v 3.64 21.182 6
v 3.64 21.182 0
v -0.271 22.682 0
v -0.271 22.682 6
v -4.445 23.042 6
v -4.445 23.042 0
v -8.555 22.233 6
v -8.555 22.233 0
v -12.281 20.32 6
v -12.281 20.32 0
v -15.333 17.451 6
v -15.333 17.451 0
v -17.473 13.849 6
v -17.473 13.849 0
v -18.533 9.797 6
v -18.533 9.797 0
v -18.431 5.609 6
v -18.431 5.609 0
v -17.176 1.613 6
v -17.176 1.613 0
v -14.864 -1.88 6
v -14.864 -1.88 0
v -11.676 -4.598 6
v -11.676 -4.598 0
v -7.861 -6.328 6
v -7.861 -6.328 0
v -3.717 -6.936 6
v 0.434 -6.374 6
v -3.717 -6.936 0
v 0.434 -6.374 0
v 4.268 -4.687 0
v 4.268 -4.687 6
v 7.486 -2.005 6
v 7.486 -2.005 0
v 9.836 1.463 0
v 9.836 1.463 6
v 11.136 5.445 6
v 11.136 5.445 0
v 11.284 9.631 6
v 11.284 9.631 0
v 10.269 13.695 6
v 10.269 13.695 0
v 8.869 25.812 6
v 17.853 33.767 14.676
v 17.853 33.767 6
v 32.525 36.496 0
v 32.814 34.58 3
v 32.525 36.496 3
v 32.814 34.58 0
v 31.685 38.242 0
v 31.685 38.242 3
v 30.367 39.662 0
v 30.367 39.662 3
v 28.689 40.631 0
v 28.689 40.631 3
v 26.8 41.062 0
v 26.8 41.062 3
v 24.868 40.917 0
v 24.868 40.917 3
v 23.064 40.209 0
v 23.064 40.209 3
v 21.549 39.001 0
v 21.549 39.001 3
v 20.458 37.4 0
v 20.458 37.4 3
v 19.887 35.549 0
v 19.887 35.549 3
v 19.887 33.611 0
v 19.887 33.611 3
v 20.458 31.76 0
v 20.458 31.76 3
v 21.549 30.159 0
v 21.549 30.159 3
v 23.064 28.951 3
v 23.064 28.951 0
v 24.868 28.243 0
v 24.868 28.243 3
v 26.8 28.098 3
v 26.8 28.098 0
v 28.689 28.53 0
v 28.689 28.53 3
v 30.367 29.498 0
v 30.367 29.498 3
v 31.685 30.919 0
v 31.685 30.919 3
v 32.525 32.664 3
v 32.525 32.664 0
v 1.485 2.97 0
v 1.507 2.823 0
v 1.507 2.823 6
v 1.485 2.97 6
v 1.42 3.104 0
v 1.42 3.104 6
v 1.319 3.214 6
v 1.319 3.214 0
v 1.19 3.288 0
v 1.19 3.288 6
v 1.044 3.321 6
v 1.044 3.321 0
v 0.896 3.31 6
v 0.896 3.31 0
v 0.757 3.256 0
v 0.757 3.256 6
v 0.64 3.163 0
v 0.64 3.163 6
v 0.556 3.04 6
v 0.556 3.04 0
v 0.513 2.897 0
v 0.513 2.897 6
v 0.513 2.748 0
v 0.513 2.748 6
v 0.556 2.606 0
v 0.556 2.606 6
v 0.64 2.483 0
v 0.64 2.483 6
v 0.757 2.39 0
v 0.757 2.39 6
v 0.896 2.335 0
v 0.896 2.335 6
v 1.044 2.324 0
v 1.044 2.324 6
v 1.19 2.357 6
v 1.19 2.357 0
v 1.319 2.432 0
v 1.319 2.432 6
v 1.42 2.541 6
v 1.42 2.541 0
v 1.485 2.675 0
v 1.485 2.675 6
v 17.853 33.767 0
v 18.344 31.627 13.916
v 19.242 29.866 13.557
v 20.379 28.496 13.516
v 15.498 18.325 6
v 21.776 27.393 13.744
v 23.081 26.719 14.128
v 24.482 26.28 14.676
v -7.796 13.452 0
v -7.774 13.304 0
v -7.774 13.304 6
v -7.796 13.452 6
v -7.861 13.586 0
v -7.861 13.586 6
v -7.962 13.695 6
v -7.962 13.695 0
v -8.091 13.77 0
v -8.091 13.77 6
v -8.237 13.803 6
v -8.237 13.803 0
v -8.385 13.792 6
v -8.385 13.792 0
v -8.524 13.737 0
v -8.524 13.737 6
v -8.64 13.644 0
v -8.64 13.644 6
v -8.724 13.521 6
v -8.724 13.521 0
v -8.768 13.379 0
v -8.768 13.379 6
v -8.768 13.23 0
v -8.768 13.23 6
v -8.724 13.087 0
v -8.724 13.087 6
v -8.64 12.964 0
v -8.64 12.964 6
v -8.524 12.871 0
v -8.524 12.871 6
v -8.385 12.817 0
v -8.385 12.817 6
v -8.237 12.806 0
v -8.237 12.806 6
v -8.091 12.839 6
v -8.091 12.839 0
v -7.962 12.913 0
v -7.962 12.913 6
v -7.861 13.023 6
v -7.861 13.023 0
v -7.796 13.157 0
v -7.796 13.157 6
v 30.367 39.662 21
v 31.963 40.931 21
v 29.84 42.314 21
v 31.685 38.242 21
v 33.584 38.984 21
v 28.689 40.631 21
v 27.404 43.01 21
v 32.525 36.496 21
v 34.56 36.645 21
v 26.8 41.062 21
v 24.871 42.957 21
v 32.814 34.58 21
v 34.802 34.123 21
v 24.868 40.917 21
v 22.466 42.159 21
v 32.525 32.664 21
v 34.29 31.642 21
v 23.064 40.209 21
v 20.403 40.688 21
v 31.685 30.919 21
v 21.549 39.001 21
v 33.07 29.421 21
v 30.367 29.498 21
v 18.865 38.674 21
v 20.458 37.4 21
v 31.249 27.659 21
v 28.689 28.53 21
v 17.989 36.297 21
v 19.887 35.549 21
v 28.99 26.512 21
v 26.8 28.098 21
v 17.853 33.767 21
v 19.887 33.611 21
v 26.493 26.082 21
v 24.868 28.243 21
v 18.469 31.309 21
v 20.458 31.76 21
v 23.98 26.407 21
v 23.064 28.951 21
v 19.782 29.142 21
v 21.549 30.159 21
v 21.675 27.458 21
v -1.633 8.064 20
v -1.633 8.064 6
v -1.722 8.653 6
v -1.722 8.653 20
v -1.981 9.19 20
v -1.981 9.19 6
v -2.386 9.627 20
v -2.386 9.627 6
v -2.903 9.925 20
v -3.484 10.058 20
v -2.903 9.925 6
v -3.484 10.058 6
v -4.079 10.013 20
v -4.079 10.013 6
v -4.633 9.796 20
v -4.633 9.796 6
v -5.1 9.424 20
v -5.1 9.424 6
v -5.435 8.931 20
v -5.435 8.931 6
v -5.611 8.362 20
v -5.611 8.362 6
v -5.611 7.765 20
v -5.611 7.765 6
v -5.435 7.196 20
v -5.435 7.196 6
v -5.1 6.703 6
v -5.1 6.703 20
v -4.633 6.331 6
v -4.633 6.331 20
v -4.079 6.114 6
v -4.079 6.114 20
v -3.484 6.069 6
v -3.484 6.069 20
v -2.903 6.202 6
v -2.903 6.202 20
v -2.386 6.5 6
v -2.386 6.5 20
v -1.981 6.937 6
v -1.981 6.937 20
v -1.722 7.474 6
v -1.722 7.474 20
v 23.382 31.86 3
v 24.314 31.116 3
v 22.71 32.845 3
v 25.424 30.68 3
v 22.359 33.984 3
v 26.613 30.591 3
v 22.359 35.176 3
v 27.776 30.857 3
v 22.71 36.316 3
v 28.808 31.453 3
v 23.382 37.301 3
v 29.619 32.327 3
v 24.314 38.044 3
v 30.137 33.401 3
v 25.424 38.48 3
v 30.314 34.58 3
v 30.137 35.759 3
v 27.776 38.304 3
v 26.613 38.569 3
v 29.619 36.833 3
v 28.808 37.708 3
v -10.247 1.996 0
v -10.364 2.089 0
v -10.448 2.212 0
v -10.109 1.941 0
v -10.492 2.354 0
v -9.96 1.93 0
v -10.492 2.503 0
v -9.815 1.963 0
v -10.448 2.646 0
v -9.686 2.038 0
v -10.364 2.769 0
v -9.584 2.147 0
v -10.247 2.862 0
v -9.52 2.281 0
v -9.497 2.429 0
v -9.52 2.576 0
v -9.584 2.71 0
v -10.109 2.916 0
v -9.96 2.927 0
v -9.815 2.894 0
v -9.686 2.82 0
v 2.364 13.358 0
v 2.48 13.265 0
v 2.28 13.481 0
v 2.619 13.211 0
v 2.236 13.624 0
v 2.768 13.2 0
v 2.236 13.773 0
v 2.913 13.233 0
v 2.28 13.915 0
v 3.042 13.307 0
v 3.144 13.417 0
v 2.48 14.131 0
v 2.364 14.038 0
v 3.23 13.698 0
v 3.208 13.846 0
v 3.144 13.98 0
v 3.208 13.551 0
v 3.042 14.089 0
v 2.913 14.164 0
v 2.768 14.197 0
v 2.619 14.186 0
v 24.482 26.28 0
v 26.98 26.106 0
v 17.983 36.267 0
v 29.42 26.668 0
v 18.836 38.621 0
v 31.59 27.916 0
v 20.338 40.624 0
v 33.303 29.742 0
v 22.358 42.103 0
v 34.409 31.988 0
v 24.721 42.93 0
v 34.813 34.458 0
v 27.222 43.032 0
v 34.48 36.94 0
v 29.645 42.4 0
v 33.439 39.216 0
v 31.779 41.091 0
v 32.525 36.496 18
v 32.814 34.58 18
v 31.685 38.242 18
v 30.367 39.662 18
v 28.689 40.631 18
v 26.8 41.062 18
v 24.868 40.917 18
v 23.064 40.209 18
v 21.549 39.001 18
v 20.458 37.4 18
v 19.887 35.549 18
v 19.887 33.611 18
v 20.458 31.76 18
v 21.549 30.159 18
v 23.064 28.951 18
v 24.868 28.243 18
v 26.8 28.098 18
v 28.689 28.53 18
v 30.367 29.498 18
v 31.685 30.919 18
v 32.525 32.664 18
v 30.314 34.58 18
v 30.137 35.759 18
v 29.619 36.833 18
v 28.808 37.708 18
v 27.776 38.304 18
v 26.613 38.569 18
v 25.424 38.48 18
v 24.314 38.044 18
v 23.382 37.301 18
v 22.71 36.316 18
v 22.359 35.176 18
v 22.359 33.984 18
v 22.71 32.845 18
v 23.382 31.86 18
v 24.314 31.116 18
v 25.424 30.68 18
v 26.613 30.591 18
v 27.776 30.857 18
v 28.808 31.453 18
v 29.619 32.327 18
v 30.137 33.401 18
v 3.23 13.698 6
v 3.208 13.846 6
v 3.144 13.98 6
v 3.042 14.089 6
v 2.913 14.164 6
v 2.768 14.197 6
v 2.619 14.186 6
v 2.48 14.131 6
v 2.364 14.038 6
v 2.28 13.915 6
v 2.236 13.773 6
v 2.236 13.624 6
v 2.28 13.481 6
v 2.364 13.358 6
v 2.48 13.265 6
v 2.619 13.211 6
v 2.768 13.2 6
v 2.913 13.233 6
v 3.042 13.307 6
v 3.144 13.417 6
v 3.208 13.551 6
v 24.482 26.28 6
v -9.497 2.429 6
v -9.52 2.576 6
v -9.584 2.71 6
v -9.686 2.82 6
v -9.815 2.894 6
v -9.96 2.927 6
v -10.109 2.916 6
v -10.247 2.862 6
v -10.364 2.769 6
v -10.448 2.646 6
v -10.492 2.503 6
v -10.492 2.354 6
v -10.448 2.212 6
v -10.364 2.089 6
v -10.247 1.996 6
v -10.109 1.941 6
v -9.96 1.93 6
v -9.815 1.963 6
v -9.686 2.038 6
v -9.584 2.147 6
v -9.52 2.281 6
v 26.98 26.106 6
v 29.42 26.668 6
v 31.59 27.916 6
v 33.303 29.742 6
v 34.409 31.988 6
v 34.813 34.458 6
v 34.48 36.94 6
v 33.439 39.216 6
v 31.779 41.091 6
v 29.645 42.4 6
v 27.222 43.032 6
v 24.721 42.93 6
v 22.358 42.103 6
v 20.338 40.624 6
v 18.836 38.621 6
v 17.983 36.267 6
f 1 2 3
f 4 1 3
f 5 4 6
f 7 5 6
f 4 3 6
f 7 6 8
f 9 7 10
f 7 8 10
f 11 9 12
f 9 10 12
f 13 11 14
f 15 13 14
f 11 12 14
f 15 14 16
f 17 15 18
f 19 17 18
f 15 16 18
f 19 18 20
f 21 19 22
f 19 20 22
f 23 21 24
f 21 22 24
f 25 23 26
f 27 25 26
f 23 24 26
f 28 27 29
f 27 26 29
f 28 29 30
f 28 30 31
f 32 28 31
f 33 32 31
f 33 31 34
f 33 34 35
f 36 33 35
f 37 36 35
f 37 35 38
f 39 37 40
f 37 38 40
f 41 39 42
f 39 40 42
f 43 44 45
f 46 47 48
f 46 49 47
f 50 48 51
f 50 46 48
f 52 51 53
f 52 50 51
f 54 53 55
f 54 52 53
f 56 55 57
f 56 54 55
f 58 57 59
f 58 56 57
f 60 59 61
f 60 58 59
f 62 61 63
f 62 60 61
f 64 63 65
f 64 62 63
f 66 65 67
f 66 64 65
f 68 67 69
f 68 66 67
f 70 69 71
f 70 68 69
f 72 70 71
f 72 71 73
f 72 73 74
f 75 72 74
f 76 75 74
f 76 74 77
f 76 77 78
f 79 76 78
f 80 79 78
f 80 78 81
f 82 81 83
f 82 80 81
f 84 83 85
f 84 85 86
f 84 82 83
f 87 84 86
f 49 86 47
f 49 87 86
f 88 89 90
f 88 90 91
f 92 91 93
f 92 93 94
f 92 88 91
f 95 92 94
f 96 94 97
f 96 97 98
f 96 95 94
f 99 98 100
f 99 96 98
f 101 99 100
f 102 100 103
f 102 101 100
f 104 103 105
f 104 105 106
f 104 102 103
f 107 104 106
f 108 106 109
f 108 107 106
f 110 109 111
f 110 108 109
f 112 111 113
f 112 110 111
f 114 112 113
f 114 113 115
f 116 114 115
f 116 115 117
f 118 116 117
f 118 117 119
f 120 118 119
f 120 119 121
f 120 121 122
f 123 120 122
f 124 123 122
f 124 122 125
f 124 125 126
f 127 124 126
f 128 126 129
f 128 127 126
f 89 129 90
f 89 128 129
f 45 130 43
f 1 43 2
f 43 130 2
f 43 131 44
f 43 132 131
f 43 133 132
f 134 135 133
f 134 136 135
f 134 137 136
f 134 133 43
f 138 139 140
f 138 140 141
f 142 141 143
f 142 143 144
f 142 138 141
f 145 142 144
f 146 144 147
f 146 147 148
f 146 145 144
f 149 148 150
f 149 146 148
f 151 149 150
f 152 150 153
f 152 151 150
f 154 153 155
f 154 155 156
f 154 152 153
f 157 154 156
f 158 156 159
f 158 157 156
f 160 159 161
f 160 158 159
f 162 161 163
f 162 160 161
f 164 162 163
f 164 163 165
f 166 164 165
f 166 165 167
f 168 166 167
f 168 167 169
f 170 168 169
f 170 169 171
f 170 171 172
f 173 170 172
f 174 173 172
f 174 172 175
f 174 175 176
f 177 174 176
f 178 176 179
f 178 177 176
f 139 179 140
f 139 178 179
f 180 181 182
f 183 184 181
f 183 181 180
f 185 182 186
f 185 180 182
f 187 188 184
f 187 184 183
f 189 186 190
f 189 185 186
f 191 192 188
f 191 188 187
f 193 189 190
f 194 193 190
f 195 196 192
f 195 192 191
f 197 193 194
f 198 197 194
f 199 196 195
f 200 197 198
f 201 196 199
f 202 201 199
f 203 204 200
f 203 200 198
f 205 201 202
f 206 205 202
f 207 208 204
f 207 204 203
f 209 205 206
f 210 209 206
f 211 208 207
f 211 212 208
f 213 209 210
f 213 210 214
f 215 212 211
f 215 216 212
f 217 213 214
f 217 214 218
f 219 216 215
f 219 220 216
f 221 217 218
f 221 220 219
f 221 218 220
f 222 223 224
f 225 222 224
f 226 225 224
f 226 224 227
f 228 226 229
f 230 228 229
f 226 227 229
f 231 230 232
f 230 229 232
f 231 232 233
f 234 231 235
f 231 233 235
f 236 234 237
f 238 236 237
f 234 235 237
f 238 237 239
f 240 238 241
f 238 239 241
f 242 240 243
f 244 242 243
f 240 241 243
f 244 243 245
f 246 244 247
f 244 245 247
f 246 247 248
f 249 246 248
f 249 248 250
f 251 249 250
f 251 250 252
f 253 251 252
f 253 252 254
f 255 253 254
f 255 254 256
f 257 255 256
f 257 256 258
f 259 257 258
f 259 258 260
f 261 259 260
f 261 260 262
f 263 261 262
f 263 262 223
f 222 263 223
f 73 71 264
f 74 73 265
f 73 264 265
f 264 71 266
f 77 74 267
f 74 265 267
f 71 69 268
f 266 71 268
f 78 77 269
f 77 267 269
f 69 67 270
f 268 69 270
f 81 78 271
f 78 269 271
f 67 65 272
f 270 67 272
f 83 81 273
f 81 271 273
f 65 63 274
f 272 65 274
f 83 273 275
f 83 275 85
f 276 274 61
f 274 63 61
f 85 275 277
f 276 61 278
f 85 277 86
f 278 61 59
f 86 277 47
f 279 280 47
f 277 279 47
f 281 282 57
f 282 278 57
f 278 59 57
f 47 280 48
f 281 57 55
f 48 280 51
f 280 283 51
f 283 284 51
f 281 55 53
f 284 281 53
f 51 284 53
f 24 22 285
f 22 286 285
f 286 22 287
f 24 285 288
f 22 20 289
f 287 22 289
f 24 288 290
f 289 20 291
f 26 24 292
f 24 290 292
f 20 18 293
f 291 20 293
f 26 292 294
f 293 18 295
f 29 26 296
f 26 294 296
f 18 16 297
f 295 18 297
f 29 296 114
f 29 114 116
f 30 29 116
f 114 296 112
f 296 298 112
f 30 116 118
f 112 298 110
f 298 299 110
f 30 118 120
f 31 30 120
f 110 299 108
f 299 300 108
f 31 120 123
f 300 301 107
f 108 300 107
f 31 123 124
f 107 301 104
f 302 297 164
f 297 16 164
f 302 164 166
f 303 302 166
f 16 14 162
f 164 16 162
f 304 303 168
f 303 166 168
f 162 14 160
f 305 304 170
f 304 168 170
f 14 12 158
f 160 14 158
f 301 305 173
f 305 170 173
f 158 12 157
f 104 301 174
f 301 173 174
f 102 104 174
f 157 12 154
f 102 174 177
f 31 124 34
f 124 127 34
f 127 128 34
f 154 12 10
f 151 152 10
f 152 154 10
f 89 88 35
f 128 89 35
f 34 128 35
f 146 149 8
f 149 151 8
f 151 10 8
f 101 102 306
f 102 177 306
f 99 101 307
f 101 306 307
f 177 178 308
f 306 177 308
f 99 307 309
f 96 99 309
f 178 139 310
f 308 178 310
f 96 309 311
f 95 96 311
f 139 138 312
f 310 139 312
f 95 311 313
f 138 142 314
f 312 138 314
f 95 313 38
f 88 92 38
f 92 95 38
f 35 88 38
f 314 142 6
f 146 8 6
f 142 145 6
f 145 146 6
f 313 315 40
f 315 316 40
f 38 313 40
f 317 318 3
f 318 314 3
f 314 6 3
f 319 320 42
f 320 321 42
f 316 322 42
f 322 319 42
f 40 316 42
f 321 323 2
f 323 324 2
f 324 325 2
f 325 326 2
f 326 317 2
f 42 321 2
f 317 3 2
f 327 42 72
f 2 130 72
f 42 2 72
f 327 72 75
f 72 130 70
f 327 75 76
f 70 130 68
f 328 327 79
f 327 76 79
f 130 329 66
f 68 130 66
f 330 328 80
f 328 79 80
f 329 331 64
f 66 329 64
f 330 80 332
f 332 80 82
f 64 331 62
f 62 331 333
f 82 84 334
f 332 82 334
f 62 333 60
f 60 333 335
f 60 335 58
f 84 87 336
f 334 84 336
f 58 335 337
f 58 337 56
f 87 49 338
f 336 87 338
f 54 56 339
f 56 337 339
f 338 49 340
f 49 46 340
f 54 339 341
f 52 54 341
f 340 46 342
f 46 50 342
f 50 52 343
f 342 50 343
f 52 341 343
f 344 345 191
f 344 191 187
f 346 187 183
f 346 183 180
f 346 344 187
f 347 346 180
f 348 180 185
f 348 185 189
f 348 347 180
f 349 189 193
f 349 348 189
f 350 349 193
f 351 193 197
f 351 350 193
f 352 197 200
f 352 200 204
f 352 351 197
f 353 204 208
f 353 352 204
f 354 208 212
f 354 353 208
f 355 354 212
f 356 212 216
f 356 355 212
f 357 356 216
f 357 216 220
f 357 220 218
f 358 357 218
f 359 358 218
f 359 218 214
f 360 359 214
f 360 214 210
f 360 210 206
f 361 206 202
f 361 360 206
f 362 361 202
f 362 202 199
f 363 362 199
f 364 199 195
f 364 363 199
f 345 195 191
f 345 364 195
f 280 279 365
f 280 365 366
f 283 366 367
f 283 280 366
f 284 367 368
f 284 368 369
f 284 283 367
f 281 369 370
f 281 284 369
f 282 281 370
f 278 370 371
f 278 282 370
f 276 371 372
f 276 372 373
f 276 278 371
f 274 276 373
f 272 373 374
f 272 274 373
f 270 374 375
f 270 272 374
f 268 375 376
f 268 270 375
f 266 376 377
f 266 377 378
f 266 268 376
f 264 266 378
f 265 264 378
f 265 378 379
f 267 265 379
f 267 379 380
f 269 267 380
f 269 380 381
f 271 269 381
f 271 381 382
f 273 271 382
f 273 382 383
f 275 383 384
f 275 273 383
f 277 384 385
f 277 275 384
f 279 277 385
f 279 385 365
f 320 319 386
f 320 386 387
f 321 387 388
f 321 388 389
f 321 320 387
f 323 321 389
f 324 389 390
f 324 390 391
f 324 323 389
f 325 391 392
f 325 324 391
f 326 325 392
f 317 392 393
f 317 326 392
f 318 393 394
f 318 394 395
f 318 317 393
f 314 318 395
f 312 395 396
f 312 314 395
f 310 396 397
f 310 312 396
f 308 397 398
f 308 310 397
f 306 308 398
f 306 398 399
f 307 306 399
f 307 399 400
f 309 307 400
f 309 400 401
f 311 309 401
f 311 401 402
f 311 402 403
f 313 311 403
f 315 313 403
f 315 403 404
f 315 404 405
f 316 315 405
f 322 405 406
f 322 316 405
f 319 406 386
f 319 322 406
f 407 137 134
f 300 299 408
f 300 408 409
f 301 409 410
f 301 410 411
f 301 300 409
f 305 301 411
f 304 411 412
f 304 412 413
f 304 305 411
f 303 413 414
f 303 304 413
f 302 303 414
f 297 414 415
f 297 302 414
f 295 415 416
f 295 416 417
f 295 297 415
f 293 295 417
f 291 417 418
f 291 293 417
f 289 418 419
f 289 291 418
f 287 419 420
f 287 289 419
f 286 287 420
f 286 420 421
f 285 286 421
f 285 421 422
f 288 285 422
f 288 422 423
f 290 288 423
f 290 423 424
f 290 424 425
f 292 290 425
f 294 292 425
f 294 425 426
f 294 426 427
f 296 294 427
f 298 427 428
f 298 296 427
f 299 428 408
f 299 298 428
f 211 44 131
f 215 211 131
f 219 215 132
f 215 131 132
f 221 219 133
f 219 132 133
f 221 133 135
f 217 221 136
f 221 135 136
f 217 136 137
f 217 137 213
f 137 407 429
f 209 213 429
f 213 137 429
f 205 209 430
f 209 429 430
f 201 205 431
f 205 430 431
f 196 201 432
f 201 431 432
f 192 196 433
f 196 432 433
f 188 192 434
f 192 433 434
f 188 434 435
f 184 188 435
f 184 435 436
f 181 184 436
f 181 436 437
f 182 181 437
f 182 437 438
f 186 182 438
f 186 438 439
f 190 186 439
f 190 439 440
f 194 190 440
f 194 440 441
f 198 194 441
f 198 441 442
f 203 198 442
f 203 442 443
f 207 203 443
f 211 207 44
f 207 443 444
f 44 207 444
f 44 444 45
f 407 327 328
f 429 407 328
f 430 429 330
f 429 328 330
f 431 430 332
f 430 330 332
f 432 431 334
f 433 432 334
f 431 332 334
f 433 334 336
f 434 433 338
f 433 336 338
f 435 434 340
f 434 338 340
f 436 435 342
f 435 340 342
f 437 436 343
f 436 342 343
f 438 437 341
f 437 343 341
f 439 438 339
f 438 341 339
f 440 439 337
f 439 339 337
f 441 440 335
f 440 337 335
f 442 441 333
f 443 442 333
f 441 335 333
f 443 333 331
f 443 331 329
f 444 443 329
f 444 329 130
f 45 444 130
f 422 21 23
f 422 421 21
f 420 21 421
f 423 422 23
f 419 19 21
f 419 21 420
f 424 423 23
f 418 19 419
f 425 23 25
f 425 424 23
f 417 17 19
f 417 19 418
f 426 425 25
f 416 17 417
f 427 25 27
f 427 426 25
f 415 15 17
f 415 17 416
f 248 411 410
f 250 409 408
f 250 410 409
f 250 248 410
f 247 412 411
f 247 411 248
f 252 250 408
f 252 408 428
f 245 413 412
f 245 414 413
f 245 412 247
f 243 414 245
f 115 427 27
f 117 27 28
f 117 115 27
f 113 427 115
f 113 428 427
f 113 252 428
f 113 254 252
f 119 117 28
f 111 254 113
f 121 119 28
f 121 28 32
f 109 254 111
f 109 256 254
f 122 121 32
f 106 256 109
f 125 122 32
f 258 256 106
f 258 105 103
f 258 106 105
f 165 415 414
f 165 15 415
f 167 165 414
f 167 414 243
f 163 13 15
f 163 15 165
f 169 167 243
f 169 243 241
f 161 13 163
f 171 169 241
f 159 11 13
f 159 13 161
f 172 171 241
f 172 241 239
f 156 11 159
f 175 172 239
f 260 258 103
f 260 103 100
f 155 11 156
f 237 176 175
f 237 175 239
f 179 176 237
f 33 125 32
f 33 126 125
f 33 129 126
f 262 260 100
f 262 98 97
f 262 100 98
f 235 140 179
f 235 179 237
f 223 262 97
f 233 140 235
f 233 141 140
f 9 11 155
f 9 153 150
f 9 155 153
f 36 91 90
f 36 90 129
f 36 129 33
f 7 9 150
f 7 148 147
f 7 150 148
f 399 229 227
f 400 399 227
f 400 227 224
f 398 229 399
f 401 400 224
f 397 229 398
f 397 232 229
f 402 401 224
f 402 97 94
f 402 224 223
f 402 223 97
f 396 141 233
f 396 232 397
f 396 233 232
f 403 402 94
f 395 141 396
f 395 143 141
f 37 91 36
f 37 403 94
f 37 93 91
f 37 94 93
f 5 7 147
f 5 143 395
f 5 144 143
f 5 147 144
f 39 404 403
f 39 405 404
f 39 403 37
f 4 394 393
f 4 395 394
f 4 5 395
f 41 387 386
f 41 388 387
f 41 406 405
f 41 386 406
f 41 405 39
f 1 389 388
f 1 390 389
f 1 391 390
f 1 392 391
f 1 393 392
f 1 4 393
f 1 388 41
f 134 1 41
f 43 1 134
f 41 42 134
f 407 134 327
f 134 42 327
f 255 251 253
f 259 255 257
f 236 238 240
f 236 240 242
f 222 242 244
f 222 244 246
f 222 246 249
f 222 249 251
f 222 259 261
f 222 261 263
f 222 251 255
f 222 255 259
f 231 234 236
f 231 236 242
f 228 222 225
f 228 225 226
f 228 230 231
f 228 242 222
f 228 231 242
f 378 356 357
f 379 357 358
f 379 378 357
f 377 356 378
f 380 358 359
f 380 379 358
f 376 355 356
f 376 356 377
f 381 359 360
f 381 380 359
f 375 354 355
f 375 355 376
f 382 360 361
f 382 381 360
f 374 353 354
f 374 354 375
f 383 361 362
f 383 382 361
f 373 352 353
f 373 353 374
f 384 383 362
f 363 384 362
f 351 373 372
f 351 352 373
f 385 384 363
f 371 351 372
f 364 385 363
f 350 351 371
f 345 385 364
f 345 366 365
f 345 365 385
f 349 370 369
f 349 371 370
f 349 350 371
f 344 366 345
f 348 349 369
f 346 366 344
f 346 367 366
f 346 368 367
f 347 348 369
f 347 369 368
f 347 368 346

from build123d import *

# Parameters (mm, degrees)
SKETCH2_R            = 6.5
SKETCH2_R_2          = 0.5
SKETCH2_R_3          = 2
BOSS_EXTRUDE2_DEPTH  = 6
SKETCH2_14_R         = 2
BOSS_EXTRUDE9_DEPTH  = 20
BOSS_EXTRUDE5_START  = 6
SKETCH2_7_R          = 8.5
SKETCH2_7_R_2        = 6.5
BOSS_EXTRUDE5_DEPTH  = 15
BOSS_EXTRUDE10_START = 3
SKETCH2_16_R         = 6.5
SKETCH2_16_R_2       = 4
BOSS_EXTRUDE10_DEPTH = 15
RIB20_REACH          = 60.526
SKETCH6_WALL_W       = 131.852983596
SKETCH6_WALL_H       = 10


with BuildPart() as part:
    # Sketch2 → Boss-Extrude2 (new body)
    with BuildSketch(Plane.XY):
        with BuildLine():
            Line((10.269230614, 13.695123544), (24.482427586, 26.279928647))
            ThreePointArc((24.482427586, 26.279928647), (32.678156537, 40.21498183), (17.85326379, 33.766863091))
            Line((17.85326379, 33.766863091), (3.640066818, 21.182057988))
            ThreePointArc((3.640066818, 21.182057988), (-14.86387718, -1.880208276), (10.269230614, 13.695123544))
        make_face()
        with Locations((26.31426226, 34.580192603)):
            Circle(SKETCH2_R, mode=Mode.SUBTRACT)
        with Locations((2.730418762, 13.698326645)):
            Circle(SKETCH2_R_2, mode=Mode.SUBTRACT)
        with Locations((-9.997369792, 2.428748191)):
            Circle(SKETCH2_R_2, mode=Mode.SUBTRACT)
        with Locations((1.006939142, 2.822683307)):
            Circle(SKETCH2_R_2, mode=Mode.SUBTRACT)
        with Locations((-8.273890172, 13.304391529)):
            Circle(SKETCH2_R_2, mode=Mode.SUBTRACT)
        with Locations((-3.633475515, 8.063537418)):
            Circle(SKETCH2_R_3, mode=Mode.SUBTRACT)
    extrude(amount=BOSS_EXTRUDE2_DEPTH)

    # Sketch2<14> → Boss-Extrude9 (add)
    with BuildSketch(Plane.XY):
        with Locations((-3.633475515, 8.063537418)):
            Circle(SKETCH2_14_R)
    extrude(amount=BOSS_EXTRUDE9_DEPTH)

    # Sketch2<7> → Boss-Extrude5 (add)
    with BuildSketch(Plane.XY.offset(BOSS_EXTRUDE5_START)):
        with Locations(Location((26.31426226, 34.580192603, 0), (0, 0, 185.490794513))):
            Circle(SKETCH2_7_R)
        with Locations((26.31426226, 34.580192603)):
            Circle(SKETCH2_7_R_2, mode=Mode.SUBTRACT)
    extrude(amount=BOSS_EXTRUDE5_DEPTH)

    # Sketch2<16> → Boss-Extrude10 (add)
    with BuildSketch(Plane.XY.offset(BOSS_EXTRUDE10_START)):
        with Locations((26.31426226, 34.580192603)):
            Circle(SKETCH2_16_R)
        with Locations((26.31426226, 34.580192603)):
            Circle(SKETCH2_16_R_2, mode=Mode.SUBTRACT)
    extrude(amount=BOSS_EXTRUDE10_DEPTH)

    # Sketch6 wall → Rib20 (add, up to next)
    with BuildSketch(Plane(origin=(16.066946169, 25.506901345, 9.75), x_dir=(-0.606734584094, -0.537221605037, -0.585889146124), z_dir=(-0.438651362827, -0.388395511607, 0.810391207044)), mode=Mode.PRIVATE) as rib20_sk1:
        Rectangle(SKETCH6_WALL_W, SKETCH6_WALL_H)
    rib20_tool1 = extrude(rib20_sk1.sketch, amount=-RIB20_REACH, mode=Mode.PRIVATE) - part.part
    add(rib20_tool1.solids().sort_by_distance((16.066946169, 25.506901345, 9.75))[0])


solid = part.part
